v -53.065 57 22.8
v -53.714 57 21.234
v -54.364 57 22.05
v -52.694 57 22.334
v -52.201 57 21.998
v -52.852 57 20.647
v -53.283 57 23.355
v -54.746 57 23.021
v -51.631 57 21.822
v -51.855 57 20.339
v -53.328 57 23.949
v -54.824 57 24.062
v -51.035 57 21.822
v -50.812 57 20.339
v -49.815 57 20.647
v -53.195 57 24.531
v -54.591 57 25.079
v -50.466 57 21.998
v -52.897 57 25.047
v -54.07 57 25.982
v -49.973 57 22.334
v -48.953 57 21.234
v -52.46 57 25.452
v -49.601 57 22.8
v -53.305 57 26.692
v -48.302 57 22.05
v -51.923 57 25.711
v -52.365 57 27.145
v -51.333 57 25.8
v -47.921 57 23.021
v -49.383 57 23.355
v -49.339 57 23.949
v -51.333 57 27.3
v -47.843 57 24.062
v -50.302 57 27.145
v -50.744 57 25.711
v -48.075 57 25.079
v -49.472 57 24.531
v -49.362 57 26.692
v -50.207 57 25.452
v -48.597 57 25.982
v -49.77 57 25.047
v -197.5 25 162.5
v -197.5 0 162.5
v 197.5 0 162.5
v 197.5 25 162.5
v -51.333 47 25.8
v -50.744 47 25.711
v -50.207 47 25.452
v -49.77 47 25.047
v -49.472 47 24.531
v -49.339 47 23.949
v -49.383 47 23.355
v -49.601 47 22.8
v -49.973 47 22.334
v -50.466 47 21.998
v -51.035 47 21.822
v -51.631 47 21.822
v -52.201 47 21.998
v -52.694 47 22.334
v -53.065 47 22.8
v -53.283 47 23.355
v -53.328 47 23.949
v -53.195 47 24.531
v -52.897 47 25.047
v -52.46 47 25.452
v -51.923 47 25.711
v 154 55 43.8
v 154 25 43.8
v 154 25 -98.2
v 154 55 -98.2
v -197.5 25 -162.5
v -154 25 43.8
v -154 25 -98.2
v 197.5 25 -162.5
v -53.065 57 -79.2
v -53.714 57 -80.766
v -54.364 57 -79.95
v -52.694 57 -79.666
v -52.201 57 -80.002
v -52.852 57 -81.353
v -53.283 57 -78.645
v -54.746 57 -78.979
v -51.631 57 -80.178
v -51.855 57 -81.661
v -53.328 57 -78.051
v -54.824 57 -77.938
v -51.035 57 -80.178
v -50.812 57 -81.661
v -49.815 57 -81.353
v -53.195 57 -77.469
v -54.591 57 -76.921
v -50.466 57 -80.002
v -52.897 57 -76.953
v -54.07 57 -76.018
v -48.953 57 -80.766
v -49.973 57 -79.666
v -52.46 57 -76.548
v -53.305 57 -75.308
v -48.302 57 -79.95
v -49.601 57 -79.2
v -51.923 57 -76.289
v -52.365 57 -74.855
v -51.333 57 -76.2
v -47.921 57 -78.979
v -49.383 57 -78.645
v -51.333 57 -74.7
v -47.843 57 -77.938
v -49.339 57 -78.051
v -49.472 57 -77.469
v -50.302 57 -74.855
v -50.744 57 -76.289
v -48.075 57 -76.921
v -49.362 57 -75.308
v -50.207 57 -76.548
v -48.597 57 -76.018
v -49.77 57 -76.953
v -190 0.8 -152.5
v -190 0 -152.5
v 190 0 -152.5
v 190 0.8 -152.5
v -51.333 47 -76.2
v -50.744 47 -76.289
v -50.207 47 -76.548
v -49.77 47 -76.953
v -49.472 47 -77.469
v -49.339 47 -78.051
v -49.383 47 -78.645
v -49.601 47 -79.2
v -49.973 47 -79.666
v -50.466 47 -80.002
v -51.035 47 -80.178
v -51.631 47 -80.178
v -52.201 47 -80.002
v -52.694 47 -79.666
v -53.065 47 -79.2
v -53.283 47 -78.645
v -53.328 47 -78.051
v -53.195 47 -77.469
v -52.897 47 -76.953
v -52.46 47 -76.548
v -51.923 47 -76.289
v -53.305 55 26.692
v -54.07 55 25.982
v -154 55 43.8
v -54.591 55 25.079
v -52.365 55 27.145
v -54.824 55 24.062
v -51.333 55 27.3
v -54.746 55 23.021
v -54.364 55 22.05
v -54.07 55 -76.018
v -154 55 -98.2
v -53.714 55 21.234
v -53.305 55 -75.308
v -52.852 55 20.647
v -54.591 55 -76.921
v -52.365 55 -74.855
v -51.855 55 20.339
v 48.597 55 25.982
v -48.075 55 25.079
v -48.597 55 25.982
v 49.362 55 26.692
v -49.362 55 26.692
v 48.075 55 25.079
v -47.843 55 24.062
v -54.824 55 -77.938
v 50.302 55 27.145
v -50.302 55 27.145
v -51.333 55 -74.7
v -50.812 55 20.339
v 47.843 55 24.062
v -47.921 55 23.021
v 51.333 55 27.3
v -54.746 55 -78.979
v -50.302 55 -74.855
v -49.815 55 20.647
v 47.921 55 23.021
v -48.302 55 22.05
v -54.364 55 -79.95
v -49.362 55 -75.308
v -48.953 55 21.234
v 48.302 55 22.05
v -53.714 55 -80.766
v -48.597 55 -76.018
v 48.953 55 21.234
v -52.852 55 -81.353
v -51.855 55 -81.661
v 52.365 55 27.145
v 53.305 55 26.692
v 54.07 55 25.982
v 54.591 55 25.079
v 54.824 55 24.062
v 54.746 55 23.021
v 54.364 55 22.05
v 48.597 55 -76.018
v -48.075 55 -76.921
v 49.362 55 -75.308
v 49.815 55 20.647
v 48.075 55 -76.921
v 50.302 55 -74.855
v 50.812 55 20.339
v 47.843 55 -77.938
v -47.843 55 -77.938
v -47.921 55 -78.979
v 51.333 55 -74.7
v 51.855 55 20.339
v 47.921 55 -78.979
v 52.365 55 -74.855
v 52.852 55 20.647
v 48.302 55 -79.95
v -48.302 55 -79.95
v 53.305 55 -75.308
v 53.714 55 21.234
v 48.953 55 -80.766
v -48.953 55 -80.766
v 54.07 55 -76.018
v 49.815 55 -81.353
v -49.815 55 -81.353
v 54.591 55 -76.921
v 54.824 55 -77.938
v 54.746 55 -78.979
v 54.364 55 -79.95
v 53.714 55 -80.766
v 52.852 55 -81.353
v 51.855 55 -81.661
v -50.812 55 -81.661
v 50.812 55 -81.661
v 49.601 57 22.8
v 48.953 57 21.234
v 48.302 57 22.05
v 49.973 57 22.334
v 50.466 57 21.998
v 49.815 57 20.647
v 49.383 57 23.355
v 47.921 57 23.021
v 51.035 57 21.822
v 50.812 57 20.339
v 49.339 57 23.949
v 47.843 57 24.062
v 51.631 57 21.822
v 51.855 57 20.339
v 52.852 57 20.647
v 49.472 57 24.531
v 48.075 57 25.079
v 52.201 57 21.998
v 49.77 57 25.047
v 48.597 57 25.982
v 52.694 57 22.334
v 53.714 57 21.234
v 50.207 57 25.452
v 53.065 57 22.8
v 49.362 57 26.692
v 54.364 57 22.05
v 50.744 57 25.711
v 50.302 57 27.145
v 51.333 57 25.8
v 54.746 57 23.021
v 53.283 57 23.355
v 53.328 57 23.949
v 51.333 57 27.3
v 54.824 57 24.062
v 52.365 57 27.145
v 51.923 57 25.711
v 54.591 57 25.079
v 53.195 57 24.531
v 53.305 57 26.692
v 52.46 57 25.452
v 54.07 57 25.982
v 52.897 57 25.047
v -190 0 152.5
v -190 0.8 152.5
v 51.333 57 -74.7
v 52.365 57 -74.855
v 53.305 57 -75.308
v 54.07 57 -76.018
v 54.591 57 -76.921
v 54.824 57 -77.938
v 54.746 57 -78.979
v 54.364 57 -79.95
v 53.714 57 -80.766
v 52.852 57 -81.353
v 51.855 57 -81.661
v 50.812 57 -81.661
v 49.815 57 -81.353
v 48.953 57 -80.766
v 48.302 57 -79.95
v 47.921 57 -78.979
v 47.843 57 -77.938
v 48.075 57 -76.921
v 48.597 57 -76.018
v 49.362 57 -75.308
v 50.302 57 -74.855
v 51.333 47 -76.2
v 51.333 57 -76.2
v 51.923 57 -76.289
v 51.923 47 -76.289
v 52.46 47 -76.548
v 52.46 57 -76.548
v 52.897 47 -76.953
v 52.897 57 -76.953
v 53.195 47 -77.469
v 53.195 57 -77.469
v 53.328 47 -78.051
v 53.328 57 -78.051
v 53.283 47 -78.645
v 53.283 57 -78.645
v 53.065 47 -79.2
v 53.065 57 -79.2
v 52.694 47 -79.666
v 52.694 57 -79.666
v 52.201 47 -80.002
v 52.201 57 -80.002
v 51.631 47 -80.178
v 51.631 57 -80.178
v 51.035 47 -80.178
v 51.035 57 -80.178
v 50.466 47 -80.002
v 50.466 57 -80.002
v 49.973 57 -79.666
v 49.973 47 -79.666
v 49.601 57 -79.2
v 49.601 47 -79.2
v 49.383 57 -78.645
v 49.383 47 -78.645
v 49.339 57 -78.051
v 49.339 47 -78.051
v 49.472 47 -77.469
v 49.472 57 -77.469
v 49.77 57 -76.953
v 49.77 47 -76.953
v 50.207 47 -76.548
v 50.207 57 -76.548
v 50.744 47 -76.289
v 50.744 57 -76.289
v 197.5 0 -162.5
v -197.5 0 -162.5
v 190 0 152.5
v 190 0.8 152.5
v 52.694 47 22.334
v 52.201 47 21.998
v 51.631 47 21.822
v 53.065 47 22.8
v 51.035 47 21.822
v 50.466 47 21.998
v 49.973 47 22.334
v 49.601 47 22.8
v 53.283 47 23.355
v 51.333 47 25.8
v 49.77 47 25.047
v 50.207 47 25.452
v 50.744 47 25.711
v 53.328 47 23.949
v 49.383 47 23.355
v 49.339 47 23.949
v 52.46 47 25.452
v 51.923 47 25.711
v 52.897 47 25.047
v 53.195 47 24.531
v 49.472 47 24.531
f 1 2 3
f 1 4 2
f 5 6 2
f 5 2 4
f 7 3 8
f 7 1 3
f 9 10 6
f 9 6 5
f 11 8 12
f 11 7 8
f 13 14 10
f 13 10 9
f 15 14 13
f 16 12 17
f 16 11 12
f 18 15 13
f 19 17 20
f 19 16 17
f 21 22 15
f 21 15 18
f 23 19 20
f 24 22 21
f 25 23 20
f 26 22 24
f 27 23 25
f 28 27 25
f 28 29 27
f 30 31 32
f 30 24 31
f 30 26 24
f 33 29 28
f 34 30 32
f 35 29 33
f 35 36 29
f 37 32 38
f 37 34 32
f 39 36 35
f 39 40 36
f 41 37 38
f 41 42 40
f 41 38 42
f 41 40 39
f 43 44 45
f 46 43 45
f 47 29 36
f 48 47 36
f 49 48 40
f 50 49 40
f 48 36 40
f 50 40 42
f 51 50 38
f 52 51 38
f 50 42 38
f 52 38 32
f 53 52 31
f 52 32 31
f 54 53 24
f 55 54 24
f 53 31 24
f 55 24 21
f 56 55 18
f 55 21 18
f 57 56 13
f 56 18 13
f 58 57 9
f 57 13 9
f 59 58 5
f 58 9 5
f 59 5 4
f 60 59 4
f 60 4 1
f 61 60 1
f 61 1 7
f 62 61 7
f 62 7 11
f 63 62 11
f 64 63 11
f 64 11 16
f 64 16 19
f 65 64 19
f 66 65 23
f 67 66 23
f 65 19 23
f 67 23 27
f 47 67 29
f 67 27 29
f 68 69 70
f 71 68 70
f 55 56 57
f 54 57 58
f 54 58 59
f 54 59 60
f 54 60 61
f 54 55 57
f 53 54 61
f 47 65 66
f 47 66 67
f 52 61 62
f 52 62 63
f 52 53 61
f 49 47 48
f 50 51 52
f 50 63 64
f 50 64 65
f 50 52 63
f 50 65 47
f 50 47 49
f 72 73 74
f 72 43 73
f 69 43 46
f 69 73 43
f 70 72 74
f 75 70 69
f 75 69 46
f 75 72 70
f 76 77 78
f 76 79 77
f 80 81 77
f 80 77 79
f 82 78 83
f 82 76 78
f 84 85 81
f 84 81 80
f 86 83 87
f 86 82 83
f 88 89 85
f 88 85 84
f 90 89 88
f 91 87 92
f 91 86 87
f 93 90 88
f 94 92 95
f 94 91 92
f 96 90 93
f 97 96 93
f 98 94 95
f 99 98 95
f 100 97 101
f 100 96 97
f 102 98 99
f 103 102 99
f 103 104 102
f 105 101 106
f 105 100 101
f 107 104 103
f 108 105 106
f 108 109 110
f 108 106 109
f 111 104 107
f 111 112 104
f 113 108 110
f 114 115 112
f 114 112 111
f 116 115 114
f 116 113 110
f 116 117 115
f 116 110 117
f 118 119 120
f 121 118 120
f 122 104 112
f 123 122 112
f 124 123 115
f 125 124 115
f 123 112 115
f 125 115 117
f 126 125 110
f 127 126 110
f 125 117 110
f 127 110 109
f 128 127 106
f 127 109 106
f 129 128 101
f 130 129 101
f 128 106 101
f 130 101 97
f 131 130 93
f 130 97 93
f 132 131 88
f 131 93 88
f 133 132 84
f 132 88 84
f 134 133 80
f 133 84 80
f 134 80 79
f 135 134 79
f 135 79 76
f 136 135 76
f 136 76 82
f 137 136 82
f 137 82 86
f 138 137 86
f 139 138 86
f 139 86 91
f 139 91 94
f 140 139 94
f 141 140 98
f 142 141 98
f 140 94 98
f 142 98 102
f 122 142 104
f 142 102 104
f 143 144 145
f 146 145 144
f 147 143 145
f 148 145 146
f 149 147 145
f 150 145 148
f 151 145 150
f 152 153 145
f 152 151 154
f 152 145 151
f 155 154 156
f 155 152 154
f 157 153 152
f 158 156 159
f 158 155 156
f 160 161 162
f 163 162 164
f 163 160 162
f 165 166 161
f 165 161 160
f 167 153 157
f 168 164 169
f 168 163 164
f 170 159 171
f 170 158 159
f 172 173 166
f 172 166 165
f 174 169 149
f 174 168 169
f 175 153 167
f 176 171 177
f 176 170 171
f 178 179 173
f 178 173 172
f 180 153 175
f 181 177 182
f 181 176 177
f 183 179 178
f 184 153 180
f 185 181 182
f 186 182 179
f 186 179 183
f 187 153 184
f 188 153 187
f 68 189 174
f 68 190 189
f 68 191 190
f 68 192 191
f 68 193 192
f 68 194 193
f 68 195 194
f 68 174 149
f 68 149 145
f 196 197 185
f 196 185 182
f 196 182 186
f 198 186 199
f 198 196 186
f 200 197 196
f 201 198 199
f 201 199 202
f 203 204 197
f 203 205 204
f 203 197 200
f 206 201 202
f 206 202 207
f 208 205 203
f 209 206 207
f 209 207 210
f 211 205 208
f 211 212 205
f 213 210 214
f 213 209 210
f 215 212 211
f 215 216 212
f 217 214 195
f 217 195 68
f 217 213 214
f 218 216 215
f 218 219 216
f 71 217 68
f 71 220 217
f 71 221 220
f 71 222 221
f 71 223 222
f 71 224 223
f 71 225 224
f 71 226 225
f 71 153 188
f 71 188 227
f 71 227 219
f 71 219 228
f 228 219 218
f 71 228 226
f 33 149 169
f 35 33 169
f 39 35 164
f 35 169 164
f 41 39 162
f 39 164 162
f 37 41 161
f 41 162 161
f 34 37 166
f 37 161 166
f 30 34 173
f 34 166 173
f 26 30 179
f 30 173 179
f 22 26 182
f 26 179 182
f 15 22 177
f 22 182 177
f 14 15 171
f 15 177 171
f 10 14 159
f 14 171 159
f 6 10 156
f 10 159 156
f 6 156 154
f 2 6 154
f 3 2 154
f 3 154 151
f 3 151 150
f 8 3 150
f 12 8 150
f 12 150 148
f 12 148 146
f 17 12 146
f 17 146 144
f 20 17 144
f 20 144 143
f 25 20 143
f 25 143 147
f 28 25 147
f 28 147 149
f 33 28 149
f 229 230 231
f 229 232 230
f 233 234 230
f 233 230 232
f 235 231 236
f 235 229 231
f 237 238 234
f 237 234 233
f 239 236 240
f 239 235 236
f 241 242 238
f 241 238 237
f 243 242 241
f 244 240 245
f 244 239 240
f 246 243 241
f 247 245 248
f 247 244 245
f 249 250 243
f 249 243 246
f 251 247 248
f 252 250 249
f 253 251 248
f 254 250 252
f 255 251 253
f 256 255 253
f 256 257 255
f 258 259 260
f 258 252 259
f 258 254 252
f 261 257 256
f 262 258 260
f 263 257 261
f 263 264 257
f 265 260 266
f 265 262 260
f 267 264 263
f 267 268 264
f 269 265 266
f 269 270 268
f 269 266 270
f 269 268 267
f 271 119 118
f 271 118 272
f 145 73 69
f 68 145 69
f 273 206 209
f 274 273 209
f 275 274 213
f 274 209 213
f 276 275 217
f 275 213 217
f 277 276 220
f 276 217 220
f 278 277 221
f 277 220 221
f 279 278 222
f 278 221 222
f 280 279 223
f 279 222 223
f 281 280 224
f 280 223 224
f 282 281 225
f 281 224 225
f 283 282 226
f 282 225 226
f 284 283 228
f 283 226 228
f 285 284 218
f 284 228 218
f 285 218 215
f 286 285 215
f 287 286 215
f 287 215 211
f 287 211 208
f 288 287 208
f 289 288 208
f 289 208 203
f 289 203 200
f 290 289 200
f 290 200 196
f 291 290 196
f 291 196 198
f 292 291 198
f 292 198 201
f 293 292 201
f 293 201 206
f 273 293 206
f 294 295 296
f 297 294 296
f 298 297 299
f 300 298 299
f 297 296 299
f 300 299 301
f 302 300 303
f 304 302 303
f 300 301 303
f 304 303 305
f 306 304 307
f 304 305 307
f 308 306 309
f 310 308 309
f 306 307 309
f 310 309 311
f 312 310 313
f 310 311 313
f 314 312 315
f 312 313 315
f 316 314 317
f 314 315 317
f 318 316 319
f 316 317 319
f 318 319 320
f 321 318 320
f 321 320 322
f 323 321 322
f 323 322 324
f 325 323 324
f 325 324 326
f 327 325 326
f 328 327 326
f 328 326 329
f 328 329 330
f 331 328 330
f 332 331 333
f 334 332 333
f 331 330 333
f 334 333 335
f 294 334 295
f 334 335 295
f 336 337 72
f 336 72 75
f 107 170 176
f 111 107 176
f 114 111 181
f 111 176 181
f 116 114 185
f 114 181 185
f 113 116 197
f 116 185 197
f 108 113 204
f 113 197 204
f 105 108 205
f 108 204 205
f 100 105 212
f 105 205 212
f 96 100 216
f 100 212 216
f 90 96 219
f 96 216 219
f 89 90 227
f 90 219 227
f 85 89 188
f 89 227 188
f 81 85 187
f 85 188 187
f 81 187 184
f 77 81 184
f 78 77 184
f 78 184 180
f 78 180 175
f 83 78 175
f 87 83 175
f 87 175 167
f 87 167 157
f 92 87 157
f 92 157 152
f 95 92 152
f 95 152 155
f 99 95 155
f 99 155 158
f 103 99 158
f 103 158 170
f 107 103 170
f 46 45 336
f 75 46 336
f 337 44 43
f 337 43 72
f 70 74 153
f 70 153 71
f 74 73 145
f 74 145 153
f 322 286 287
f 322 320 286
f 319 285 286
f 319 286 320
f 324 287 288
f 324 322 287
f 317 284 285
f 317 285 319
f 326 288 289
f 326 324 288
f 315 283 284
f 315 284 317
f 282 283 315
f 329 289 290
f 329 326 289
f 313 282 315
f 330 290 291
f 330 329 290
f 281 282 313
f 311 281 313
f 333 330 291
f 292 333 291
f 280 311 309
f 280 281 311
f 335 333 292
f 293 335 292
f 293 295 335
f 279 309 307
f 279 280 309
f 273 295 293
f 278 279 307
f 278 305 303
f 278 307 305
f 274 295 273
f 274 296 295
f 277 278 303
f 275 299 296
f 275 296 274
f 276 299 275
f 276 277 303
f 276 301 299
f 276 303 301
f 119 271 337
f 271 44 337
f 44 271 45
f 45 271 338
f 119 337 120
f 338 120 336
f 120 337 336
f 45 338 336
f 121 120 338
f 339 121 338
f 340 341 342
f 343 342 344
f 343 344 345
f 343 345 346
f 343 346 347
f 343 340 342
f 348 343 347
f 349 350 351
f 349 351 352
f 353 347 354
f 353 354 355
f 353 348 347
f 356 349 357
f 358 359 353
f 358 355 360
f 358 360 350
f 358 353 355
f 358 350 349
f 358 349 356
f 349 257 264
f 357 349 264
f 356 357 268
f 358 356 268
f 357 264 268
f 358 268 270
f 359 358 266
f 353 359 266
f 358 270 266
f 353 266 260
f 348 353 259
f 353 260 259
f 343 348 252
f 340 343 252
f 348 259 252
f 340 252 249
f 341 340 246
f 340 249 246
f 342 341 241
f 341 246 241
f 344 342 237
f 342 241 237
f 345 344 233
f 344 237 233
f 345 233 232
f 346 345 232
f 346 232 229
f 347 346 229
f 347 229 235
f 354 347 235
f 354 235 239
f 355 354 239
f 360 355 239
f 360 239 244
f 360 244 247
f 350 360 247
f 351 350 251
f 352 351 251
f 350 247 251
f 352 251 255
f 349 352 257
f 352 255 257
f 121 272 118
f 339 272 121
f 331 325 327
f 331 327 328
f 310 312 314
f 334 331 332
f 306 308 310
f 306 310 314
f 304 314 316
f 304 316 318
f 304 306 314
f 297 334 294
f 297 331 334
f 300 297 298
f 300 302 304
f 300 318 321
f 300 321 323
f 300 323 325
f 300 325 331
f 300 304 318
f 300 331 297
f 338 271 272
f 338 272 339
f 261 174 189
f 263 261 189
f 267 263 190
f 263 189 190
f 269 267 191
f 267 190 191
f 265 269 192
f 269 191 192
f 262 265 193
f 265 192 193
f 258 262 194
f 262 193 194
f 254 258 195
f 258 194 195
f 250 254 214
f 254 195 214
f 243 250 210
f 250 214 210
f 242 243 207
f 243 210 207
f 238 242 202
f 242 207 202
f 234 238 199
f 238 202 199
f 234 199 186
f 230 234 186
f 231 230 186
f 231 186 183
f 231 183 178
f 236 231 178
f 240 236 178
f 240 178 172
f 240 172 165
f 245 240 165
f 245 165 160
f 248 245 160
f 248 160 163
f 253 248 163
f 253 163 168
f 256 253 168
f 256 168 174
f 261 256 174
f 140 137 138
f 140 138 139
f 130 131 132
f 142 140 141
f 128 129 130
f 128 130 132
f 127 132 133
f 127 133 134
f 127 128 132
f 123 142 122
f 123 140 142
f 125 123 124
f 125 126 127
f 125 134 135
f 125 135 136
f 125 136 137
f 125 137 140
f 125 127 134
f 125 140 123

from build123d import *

# Parameters (mm, degrees)
SKETCH1_W           = 395
SKETCH1_H           = 325
BOSS_EXTRUDE1_DEPTH = 25
SKETCH2_W           = 380
SKETCH2_H           = 305
CUT_EXTRUDE1_DEPTH  = 0.8
SKETCH3_W           = 308
SKETCH3_H           = 142
SKETCH3_R           = 3.5
BOSS_EXTRUDE3_DEPTH = 30
SKETCH3_3_R         = 3.5
BOSS_EXTRUDE4_DEPTH = 32
SKETCH4_R           = 2
CUT_EXTRUDE2_DEPTH  = 10


with BuildPart() as part:
    # Sketch1 → Boss-Extrude1 (new body)
    with BuildSketch(Plane(origin=(0, 0, 0), x_dir=(1, 0, 0), z_dir=(0, 1, 0))):
        Rectangle(SKETCH1_W, SKETCH1_H)
    extrude(amount=BOSS_EXTRUDE1_DEPTH)

    # Sketch2 → Cut-Extrude1 (cut)
    with BuildSketch(Plane.XZ):
        Rectangle(SKETCH2_W, SKETCH2_H)
    extrude(amount=-CUT_EXTRUDE1_DEPTH, mode=Mode.SUBTRACT)

    # Sketch3 → Boss-Extrude3 (add)
    with BuildSketch(Plane(origin=(0, 25, 0), x_dir=(1, 0, 0), z_dir=(0, 1, 0))):
        with Locations((0, 27.2)):
            Rectangle(SKETCH3_W, SKETCH3_H)
        with Locations((-51.333333333, -23.8)):
            Circle(SKETCH3_R, mode=Mode.SUBTRACT)
        with Locations((51.333333333, -23.8)):
            Circle(SKETCH3_R, mode=Mode.SUBTRACT)
        with Locations((-51.333333333, 78.2)):
            Circle(SKETCH3_R, mode=Mode.SUBTRACT)
        with Locations((51.333333333, 78.2)):
            Circle(SKETCH3_R, mode=Mode.SUBTRACT)
    extrude(amount=BOSS_EXTRUDE3_DEPTH)

    # Sketch3<3> → Boss-Extrude4 (add)
    with BuildSketch(Plane(origin=(0, 25, 0), x_dir=(1, 0, 0), z_dir=(0, 1, 0))):
        with Locations((-51.333333333, 78.2)):
            Circle(SKETCH3_3_R)
        with Locations((51.333333333, 78.2)):
            Circle(SKETCH3_3_R)
        with Locations((51.333333333, -23.8)):
            Circle(SKETCH3_3_R)
        with Locations((-51.333333333, -23.8)):
            Circle(SKETCH3_3_R)
    extrude(amount=BOSS_EXTRUDE4_DEPTH)

    # Sketch4 → Cut-Extrude2 (cut)
    with BuildSketch(Plane(origin=(0, 57, 0), x_dir=(1, 0, 0), z_dir=(0, 1, 0))):
        with Locations((-51.333333333, 78.2)):
            Circle(SKETCH4_R)
        with Locations((51.333333333, 78.2)):
            Circle(SKETCH4_R)
        with Locations((-51.333333333, -23.8)):
            Circle(SKETCH4_R)
        with Locations((51.333333333, -23.8)):
            Circle(SKETCH4_R)
    extrude(amount=-CUT_EXTRUDE2_DEPTH, mode=Mode.SUBTRACT)


solid = part.part
